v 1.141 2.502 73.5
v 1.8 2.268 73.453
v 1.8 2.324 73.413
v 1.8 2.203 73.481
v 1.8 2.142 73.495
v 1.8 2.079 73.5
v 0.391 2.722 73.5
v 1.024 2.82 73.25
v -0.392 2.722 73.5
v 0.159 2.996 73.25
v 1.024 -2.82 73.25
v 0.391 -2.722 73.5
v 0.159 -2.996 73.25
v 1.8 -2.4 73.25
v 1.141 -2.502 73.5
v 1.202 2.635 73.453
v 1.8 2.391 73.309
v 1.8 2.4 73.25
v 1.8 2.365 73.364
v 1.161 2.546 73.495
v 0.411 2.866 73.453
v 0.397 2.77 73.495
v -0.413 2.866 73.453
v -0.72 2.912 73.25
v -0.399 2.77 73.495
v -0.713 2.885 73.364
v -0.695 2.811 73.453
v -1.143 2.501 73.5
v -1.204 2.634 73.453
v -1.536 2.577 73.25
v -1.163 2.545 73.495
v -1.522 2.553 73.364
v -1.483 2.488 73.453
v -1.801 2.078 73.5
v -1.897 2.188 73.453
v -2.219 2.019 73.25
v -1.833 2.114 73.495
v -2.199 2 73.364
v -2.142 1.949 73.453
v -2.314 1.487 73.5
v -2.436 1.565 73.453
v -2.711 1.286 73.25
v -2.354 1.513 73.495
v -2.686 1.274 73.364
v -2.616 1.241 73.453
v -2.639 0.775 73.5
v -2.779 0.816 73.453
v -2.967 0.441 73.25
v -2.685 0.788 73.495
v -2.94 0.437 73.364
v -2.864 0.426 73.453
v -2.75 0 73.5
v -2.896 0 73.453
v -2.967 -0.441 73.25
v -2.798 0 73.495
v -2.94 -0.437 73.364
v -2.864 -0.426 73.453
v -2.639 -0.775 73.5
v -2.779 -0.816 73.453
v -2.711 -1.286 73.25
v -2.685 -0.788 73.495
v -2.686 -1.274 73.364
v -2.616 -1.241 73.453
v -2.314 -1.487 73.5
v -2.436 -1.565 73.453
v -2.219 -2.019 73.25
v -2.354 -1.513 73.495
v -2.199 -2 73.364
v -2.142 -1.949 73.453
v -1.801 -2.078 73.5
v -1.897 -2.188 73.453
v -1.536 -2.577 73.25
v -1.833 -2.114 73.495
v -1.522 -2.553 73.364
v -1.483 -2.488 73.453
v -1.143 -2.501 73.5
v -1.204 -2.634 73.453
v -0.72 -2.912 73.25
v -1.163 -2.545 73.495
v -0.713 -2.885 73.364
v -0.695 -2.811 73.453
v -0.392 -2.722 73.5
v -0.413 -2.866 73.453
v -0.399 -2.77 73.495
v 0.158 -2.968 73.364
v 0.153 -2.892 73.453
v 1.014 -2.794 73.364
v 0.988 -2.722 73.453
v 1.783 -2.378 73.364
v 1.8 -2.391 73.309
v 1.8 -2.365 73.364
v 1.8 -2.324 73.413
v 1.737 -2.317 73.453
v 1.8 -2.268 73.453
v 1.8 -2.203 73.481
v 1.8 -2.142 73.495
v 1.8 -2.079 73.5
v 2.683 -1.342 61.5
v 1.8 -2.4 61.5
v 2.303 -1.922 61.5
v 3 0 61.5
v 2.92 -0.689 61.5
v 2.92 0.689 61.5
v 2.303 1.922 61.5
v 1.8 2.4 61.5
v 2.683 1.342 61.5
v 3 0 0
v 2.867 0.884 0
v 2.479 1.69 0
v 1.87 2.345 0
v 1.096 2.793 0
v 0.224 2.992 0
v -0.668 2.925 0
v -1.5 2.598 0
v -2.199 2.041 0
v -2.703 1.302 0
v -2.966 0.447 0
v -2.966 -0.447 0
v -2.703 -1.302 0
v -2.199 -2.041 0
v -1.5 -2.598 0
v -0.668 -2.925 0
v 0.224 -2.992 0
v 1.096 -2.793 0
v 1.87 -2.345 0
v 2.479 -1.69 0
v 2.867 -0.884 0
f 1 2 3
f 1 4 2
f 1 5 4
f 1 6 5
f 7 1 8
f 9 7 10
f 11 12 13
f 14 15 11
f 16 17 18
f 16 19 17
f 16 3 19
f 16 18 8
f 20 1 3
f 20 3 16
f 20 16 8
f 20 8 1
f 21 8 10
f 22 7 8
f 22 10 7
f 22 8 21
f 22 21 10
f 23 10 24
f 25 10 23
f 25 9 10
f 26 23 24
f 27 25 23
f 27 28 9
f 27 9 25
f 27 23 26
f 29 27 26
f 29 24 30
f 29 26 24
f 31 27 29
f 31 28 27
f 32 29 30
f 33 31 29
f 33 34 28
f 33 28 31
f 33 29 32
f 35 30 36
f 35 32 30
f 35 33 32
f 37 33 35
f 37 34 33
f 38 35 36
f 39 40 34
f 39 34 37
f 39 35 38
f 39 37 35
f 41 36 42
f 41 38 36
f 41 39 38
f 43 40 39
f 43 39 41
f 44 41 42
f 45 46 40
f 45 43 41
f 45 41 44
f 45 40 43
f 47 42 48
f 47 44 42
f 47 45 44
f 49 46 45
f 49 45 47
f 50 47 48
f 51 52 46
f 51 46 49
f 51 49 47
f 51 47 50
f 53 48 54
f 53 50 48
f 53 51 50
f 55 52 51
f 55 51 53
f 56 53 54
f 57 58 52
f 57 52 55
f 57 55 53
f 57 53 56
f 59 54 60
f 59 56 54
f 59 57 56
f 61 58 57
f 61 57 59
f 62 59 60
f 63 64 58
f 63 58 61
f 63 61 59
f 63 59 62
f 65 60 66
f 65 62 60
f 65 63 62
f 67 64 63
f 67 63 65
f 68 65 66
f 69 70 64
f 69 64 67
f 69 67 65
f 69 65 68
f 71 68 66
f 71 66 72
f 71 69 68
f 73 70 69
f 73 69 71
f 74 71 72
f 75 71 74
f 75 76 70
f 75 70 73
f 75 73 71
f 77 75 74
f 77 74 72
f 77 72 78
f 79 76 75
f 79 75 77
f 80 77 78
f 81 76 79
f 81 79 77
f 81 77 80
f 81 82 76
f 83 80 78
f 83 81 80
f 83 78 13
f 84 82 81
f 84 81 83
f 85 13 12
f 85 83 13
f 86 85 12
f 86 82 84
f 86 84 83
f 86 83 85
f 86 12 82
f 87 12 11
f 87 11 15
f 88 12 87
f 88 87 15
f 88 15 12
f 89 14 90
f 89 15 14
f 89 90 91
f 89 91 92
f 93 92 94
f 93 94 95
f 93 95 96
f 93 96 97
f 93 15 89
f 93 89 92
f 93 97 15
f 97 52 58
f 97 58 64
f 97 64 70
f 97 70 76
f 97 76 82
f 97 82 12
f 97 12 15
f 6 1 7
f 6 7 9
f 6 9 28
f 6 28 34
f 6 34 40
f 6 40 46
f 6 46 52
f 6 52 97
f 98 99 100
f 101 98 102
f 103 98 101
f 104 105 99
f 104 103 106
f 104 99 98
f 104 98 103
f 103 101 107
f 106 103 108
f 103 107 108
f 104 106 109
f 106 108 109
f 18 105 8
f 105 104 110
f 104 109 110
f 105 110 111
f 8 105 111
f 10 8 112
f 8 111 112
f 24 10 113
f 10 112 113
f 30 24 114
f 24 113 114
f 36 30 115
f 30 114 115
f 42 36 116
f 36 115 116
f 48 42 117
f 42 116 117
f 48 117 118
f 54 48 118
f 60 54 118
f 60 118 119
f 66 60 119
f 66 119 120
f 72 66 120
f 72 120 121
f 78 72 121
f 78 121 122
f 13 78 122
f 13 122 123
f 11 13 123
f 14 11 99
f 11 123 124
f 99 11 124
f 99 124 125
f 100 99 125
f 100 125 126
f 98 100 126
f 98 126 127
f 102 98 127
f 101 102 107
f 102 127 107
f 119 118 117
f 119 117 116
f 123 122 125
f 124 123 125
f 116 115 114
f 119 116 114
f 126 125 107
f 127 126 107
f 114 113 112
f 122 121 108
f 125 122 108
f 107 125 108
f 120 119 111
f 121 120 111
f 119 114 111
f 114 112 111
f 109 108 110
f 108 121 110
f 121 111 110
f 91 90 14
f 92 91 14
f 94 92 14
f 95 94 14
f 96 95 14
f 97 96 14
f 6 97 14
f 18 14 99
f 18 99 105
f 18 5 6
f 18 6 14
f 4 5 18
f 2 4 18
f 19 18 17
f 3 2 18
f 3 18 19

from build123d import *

# Parameters (mm, degrees)
CROQUIS1_R              = 3
SALIENTE_EXTRUIR1_DEPTH = 73.5
REDONDEO1_R             = 0.25
SKETCH1_W               = 3.065124184
SKETCH1_H               = 10
CUT_EXTRUDE1_DEPTH      = 12


with BuildPart() as part:
    # Croquis1 → Saliente-Extruir1 (new body)
    with BuildSketch(Plane.XY):
        Circle(CROQUIS1_R)
    extrude(amount=SALIENTE_EXTRUIR1_DEPTH)

    # Redondeo1
    redondeo1_edges = [part.edges().sort_by_distance(p)[0] for p in [
        (-3, 0, 73.5),
    ]]
    fillet(redondeo1_edges, radius=REDONDEO1_R)

    # Sketch1 → Cut-Extrude1 (cut)
    with BuildSketch(Plane.XY.offset(73.5)):
        with Locations((3.332562092, 1.320530023)):
            Rectangle(SKETCH1_W, SKETCH1_H)
    extrude(amount=-CUT_EXTRUDE1_DEPTH, mode=Mode.SUBTRACT)


solid = part.part
